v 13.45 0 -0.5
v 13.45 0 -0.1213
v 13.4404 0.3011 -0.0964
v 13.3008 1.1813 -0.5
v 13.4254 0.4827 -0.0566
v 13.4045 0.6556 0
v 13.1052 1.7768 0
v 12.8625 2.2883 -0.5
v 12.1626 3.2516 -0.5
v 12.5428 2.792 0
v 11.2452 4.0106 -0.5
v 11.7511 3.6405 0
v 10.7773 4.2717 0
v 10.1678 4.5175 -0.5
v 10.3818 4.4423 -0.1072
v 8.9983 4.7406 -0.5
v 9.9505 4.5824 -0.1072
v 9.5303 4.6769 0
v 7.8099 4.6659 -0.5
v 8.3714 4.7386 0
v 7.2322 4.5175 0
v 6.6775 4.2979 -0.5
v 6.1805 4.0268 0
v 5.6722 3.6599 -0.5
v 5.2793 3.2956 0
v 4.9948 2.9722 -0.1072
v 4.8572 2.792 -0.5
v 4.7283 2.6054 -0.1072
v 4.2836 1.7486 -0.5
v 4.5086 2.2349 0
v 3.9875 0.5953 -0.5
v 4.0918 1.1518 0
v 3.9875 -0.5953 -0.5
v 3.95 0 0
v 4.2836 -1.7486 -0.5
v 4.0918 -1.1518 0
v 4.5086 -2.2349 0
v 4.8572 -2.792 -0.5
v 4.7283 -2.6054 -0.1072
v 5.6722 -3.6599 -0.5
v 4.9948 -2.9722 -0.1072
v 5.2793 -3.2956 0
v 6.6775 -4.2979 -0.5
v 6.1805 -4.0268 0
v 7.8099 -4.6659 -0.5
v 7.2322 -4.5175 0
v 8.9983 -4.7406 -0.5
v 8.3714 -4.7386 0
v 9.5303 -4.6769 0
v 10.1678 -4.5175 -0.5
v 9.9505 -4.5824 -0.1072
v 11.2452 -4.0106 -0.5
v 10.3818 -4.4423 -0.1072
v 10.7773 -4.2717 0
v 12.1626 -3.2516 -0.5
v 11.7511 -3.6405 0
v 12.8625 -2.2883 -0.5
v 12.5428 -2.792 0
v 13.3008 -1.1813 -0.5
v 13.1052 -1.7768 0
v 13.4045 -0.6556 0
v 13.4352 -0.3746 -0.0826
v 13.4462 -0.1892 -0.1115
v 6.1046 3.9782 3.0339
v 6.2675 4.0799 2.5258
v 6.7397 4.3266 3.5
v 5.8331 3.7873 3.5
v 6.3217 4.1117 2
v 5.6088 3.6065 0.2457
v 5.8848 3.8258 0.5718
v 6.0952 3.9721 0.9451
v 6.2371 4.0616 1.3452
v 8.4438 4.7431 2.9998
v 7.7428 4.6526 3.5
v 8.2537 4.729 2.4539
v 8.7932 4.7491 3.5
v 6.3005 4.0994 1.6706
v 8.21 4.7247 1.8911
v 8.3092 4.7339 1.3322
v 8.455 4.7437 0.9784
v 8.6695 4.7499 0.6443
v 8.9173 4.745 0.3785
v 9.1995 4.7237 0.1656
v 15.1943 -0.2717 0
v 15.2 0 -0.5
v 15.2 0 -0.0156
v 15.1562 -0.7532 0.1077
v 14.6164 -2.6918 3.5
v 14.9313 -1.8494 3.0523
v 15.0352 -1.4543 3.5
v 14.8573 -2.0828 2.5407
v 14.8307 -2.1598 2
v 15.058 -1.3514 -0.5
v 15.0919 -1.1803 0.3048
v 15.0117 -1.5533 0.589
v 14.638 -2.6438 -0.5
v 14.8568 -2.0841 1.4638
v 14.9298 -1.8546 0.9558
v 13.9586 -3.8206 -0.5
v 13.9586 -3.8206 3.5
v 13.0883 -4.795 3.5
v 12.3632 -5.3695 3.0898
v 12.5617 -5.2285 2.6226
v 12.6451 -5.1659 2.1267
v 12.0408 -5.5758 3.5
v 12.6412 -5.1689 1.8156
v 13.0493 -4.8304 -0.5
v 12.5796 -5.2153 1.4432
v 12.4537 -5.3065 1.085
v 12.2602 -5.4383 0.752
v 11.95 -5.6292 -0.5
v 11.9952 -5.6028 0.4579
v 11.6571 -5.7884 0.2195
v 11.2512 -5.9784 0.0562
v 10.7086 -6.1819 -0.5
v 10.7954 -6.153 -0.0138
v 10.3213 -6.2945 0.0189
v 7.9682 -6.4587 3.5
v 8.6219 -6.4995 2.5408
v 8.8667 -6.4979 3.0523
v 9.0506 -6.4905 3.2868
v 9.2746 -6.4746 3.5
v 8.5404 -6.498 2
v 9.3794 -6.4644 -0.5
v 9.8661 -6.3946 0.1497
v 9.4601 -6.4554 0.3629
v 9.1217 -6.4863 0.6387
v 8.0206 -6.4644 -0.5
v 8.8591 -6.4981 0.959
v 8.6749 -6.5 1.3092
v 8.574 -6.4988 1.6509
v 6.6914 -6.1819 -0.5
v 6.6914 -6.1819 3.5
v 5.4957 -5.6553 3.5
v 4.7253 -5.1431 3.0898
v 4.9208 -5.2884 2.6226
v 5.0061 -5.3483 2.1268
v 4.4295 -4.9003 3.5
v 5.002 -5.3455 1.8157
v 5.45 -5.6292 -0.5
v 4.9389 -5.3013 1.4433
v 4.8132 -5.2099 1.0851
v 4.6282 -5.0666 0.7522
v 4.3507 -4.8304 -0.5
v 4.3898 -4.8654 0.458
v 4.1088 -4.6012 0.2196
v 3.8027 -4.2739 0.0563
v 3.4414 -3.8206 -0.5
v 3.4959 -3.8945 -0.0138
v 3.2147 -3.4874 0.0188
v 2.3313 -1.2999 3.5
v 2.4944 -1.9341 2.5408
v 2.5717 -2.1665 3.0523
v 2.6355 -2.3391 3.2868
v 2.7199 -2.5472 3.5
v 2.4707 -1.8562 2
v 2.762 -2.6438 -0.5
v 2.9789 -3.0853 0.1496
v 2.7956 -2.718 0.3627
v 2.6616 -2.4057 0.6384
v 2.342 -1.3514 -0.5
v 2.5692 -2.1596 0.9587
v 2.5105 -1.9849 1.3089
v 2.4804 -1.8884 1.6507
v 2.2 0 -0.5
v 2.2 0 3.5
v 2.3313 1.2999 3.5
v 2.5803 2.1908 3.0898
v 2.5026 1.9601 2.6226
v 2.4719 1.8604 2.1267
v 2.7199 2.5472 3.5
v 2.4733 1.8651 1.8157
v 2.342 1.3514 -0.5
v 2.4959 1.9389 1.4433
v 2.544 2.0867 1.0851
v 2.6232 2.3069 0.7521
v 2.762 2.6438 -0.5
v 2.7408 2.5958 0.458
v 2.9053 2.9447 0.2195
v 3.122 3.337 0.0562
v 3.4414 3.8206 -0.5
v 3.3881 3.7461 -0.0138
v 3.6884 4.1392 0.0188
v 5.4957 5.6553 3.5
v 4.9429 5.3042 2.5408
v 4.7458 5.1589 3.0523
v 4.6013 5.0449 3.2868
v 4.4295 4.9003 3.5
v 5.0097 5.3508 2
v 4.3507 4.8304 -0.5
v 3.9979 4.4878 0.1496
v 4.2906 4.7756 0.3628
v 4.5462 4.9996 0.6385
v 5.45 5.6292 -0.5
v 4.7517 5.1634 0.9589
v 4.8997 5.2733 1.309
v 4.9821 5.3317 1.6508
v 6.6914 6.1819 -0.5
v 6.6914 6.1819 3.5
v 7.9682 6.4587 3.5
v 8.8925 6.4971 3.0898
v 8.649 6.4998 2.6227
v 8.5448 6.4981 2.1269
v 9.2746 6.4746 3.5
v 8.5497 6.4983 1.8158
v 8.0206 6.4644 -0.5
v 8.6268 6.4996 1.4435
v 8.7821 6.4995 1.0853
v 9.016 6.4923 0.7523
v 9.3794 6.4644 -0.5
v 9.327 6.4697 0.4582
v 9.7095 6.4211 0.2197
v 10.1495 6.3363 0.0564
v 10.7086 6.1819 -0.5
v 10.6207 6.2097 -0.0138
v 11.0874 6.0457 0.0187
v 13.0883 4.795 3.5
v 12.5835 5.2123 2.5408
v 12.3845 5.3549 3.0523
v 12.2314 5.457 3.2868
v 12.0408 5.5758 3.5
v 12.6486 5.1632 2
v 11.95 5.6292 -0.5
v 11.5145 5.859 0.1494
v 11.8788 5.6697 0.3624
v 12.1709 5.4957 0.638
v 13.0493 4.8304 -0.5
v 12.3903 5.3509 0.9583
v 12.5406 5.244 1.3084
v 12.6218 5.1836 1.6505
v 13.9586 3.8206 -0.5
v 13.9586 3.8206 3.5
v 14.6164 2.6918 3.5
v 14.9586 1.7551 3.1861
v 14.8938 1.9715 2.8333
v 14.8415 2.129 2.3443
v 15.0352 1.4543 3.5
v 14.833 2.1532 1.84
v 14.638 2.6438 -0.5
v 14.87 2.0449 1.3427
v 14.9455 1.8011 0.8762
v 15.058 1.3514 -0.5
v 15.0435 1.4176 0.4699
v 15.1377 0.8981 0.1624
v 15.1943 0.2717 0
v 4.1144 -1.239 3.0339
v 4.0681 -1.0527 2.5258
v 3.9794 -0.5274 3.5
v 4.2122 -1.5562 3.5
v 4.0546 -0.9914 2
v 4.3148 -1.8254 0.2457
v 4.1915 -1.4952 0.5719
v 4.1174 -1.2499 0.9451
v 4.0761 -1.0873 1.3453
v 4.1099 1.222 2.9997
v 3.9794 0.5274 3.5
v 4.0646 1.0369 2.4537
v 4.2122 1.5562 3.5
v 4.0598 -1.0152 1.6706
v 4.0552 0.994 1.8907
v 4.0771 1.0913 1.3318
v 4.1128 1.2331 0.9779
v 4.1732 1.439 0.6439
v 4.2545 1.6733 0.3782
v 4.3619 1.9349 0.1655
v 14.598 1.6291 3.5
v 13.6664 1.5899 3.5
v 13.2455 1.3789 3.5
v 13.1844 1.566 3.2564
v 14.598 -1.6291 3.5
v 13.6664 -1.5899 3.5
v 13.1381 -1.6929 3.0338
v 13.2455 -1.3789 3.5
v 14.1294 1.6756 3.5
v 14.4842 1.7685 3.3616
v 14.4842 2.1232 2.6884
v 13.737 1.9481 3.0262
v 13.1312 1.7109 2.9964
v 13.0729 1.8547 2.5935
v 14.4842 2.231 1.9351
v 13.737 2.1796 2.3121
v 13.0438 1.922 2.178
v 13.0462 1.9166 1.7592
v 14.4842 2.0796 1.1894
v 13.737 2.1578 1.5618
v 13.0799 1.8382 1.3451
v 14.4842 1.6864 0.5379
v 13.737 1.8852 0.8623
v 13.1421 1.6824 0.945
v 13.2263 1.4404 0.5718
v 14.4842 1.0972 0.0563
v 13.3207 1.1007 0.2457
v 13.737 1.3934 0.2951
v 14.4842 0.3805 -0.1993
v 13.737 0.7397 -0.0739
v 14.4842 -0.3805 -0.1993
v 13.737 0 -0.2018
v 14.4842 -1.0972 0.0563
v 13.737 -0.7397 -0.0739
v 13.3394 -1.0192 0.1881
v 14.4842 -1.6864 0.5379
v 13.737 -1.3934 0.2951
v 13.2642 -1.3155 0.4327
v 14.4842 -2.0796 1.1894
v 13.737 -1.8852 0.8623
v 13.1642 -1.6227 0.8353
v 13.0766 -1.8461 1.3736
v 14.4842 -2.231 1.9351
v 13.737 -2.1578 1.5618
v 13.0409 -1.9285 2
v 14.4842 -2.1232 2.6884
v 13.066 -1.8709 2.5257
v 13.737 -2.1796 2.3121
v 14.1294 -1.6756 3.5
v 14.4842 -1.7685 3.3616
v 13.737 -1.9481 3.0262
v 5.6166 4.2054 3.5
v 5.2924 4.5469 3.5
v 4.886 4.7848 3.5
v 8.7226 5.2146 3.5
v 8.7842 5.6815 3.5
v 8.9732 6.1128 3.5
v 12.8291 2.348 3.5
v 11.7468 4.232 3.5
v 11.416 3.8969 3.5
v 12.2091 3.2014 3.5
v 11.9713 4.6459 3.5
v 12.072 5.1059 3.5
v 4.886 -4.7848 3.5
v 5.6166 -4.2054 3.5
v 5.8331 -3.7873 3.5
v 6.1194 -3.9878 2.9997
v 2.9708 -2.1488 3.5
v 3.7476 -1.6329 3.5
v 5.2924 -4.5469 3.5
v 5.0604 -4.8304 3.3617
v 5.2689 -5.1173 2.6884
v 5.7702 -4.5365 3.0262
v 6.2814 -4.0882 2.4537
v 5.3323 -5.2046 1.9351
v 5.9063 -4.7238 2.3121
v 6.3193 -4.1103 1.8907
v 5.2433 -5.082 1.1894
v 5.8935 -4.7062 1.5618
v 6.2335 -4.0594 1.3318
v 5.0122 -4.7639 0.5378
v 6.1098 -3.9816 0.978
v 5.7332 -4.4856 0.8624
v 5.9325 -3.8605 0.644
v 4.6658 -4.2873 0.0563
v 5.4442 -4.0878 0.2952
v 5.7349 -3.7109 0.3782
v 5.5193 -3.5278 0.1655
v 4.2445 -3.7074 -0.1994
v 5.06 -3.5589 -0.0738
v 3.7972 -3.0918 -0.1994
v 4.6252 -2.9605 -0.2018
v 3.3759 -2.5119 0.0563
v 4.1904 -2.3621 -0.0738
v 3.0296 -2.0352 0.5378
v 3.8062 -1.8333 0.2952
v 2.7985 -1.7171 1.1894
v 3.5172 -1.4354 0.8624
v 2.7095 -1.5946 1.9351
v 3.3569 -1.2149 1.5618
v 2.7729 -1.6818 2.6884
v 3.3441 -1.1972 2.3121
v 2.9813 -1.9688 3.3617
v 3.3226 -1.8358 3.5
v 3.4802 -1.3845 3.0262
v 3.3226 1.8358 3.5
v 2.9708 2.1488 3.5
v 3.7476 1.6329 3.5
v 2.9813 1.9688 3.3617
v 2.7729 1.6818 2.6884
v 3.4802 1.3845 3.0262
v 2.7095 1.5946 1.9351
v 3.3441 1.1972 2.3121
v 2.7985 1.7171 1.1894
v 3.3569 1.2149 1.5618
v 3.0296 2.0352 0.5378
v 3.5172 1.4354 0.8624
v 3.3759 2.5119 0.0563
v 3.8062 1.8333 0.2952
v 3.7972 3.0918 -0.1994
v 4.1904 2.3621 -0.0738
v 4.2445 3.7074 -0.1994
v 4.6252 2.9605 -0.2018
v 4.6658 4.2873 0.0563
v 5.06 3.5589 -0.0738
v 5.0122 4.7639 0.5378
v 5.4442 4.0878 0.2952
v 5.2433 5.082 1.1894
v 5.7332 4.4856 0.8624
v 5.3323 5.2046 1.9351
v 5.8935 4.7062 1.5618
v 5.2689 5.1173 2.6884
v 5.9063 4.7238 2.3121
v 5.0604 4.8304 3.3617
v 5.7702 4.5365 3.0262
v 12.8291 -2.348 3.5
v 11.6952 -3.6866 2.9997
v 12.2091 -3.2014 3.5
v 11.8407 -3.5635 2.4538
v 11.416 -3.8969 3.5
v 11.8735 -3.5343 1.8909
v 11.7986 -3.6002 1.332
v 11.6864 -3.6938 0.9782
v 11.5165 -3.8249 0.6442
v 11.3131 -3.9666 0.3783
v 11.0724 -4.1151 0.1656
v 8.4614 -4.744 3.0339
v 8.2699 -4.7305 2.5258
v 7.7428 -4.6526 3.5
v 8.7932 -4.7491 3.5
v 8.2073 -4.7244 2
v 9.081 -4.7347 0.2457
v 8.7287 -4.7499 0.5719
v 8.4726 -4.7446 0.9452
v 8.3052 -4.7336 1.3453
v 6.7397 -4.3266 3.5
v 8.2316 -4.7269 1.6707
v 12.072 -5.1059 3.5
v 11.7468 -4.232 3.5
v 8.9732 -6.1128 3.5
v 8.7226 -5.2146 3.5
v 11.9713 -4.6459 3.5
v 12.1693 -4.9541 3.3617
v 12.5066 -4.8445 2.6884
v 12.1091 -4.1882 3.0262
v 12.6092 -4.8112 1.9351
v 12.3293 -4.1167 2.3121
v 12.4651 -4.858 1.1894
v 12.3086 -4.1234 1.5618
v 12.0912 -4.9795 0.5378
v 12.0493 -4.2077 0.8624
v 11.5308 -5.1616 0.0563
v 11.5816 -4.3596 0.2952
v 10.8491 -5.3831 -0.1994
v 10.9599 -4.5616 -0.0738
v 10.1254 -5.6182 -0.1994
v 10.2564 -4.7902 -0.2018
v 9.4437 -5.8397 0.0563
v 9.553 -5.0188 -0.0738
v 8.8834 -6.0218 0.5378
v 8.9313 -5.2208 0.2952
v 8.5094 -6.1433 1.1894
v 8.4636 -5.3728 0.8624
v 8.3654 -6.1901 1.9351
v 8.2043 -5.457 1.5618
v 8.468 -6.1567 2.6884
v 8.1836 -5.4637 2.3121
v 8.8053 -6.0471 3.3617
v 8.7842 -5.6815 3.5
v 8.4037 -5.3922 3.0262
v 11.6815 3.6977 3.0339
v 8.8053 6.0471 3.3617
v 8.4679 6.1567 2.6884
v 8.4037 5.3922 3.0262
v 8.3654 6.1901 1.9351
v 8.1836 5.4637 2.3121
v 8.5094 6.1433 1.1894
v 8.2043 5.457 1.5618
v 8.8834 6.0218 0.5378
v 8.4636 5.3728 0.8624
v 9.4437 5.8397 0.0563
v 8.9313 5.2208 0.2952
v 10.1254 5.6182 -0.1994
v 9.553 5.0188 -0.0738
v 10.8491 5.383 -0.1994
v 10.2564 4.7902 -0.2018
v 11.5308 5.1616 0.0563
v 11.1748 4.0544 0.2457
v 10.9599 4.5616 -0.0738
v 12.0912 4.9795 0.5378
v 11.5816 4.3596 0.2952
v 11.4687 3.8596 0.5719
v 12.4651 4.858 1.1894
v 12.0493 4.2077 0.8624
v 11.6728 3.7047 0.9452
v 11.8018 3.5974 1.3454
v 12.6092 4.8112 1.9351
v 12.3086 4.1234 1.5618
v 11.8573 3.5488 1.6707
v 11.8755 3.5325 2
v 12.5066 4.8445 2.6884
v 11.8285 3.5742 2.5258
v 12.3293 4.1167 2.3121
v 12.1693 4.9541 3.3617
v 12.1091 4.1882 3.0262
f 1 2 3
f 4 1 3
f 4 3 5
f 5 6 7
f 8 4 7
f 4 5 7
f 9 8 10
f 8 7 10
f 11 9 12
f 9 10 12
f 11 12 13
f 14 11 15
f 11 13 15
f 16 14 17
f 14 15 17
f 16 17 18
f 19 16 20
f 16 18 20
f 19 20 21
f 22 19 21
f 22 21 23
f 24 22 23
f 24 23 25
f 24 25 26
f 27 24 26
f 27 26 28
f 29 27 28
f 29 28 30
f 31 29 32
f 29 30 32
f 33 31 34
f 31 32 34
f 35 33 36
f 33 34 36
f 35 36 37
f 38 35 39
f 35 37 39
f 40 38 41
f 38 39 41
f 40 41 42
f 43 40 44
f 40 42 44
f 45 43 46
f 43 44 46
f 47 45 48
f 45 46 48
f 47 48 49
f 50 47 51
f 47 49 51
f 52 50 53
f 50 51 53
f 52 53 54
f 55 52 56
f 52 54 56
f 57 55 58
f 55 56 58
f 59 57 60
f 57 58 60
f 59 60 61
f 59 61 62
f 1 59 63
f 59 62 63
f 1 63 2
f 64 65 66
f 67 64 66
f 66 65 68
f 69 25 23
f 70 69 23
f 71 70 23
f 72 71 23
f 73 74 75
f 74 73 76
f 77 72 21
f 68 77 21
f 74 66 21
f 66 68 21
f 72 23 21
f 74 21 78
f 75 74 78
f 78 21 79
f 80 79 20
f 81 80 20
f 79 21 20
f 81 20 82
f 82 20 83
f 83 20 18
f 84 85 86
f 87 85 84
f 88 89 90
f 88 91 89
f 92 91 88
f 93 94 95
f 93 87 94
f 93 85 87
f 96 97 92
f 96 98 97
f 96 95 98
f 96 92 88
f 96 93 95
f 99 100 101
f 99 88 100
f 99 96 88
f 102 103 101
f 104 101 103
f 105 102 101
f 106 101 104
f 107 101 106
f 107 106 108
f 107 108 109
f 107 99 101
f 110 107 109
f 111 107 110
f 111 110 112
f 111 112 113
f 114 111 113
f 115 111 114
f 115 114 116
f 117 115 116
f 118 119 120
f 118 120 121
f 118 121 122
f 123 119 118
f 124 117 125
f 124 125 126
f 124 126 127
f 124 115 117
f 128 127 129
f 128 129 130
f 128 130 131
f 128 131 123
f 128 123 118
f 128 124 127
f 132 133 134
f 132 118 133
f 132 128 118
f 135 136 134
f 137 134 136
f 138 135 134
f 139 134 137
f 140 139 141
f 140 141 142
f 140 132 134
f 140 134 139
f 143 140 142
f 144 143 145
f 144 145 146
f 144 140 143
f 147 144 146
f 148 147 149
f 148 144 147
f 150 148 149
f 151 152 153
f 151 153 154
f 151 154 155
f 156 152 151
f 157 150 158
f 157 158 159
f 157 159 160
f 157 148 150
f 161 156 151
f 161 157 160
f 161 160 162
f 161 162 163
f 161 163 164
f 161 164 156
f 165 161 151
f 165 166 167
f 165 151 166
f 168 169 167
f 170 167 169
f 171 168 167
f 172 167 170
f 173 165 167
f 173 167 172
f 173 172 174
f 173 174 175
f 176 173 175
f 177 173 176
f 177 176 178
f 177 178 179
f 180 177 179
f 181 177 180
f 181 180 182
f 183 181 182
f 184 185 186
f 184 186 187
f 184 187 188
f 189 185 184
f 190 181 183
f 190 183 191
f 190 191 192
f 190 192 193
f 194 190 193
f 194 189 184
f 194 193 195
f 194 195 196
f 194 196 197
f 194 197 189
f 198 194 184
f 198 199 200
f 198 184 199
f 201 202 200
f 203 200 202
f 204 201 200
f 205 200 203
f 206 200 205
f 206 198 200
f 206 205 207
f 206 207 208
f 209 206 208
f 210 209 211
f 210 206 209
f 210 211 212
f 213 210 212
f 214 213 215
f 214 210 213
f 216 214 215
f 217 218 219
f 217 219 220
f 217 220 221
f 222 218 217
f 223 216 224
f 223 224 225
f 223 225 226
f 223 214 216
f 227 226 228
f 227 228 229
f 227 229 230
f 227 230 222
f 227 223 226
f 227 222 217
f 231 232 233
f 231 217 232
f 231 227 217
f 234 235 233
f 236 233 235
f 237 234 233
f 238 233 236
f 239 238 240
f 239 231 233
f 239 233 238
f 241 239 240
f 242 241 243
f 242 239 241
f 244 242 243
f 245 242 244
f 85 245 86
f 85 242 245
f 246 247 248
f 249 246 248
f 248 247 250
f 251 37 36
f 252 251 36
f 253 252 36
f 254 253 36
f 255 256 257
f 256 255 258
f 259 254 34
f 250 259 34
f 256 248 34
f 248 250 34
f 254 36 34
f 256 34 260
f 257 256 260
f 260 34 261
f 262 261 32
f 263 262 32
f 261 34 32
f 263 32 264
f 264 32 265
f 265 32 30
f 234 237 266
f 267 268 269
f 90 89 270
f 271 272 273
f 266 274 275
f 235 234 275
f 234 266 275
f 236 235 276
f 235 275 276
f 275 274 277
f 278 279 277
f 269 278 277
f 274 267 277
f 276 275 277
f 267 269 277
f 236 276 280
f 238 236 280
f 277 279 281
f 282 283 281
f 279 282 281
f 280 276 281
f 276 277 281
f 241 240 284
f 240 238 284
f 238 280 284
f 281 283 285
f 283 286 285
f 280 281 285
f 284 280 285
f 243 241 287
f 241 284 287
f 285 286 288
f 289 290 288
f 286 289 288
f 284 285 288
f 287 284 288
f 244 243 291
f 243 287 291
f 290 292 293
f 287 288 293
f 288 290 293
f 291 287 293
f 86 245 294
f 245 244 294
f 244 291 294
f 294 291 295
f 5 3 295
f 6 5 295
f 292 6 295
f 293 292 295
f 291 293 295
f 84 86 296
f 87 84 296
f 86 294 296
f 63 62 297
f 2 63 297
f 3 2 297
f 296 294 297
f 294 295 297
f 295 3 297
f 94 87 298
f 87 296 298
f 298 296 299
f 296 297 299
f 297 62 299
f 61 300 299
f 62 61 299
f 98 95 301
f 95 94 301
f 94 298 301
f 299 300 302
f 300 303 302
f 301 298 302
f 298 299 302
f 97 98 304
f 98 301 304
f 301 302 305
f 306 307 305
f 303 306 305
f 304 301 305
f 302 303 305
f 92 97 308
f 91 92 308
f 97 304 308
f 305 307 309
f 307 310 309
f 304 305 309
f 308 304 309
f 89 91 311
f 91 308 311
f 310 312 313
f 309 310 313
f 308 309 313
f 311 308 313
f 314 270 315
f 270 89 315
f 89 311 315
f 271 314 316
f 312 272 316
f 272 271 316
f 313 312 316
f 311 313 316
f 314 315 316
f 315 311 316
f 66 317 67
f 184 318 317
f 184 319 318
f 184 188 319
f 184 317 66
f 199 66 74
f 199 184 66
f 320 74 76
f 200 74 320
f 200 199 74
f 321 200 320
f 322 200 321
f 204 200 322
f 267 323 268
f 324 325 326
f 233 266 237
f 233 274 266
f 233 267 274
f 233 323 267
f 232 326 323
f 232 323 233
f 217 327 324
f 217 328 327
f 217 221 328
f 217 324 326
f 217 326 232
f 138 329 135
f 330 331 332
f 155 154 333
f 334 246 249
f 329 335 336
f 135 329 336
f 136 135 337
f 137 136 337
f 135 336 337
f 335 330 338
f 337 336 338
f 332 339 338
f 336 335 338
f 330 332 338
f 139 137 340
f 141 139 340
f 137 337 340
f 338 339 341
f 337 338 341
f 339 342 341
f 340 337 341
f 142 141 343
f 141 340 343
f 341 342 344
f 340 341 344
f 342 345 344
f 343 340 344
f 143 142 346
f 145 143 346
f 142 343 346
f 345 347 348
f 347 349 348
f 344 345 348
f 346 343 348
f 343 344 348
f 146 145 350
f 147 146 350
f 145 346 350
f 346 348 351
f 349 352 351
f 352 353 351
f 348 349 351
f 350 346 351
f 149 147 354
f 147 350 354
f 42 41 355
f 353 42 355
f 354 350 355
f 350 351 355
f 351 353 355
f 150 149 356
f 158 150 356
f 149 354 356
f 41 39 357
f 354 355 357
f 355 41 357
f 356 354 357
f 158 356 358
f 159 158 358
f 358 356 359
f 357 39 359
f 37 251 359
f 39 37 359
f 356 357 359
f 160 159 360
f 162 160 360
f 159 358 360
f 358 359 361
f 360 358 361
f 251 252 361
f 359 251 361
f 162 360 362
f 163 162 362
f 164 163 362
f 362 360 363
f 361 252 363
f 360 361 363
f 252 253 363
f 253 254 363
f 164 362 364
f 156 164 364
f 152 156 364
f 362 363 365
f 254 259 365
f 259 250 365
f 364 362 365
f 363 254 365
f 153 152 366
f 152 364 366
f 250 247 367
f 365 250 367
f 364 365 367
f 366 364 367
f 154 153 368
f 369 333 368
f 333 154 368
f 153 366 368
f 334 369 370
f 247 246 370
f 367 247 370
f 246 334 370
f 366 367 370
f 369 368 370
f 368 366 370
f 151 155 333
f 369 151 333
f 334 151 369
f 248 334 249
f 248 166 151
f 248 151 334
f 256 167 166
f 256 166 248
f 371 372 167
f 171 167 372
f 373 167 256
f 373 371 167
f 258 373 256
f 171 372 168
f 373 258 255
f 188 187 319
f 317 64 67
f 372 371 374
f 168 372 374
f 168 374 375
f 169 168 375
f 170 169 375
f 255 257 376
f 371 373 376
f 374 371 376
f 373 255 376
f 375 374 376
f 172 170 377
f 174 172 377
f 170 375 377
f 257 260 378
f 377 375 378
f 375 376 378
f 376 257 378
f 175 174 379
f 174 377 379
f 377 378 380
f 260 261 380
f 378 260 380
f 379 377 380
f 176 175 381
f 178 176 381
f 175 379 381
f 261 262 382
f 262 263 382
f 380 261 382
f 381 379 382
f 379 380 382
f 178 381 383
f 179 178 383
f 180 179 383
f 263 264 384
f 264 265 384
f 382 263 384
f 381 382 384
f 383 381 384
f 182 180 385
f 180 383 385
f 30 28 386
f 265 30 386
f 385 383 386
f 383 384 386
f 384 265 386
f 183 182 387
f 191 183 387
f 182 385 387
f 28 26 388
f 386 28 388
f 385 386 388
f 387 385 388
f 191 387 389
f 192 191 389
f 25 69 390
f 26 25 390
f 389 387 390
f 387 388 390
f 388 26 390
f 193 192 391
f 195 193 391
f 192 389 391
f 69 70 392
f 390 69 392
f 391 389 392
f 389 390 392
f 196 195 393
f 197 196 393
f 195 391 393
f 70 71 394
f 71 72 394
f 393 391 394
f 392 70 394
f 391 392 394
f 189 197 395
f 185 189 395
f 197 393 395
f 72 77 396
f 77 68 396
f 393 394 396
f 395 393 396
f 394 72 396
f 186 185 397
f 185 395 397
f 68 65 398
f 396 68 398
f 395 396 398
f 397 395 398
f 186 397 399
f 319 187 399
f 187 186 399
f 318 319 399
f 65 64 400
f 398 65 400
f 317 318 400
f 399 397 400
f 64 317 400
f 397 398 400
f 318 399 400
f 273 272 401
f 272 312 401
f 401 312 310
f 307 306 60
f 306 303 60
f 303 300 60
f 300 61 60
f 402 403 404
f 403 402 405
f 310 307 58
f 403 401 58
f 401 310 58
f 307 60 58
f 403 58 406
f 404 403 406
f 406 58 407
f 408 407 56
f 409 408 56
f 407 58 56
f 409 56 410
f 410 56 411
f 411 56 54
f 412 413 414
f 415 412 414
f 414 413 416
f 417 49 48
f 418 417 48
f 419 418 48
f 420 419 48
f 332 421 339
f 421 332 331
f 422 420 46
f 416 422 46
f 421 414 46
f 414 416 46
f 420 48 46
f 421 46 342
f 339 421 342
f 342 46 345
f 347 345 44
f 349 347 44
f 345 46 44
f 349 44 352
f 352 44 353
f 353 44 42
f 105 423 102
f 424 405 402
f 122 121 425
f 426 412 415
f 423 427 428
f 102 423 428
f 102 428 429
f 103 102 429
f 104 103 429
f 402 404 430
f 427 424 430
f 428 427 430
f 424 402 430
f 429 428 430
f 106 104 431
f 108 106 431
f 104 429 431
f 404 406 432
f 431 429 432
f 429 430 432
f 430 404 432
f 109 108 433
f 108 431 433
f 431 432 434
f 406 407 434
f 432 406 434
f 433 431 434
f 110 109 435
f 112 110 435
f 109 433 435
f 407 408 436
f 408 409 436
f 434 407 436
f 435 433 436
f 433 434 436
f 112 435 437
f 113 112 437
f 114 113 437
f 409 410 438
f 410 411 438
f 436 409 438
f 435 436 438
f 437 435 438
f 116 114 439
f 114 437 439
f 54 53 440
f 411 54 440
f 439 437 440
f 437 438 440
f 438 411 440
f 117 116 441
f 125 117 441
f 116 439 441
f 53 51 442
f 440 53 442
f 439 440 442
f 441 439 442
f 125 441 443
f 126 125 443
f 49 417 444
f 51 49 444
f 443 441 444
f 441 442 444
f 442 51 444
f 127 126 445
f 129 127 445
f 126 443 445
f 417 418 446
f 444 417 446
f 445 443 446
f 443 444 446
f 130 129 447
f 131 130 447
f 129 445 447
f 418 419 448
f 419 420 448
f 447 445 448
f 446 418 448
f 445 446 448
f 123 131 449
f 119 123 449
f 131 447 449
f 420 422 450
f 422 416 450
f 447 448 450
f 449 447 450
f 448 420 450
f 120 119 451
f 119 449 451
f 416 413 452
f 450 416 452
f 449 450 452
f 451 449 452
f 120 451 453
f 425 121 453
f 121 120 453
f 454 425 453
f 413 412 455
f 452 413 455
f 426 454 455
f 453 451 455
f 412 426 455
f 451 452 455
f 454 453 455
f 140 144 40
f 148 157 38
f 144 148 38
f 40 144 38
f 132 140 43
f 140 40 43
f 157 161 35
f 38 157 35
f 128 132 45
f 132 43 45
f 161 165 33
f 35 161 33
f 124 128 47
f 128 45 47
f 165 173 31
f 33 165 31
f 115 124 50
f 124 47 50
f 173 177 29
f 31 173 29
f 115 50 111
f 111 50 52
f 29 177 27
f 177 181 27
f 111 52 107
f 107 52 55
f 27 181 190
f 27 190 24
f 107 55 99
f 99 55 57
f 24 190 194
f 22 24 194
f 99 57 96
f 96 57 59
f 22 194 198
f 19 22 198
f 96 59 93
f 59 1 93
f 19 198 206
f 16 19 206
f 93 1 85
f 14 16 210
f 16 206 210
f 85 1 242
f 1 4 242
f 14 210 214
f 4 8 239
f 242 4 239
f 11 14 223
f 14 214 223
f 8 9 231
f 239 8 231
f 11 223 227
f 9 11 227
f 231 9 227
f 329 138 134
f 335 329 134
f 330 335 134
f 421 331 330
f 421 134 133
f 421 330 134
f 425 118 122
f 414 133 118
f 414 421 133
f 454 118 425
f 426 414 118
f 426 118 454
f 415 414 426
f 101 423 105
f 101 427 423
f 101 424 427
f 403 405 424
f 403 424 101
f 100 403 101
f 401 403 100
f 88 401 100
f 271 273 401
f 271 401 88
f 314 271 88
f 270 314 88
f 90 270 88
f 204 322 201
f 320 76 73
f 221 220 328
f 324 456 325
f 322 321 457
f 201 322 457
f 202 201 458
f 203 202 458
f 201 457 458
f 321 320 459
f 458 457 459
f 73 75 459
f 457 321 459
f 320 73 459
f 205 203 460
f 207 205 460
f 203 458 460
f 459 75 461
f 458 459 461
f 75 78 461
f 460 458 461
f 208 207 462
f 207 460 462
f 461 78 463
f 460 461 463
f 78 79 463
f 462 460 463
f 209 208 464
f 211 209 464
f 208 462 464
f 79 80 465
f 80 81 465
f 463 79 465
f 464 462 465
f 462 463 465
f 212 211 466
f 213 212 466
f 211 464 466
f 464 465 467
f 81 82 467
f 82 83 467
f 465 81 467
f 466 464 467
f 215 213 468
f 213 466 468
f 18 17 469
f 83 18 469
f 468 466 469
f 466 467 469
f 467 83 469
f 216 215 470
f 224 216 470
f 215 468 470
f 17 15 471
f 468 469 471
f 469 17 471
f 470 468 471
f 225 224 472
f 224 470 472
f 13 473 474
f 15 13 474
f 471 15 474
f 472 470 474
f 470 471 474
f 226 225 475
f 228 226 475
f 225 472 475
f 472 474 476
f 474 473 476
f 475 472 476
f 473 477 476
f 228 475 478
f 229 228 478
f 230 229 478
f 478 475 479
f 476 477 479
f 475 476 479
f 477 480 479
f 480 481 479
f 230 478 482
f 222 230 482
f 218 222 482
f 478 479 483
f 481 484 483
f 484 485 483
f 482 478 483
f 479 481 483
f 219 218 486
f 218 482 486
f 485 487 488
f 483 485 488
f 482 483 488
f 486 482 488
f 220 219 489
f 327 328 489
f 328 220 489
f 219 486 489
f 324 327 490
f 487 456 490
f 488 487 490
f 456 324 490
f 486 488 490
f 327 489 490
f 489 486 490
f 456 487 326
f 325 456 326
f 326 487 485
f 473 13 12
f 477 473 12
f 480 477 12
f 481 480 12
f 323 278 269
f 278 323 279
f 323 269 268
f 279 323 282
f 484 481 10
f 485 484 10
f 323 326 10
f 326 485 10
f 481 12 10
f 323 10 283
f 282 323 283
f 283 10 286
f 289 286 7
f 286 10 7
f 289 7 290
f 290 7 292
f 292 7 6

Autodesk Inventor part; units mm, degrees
ref_plane "YZ Plane" through (0, 0, 0) normal (1, 0, 0) x (0, 1, 0)
ref_plane "XZ Plane" through (0, 0, 0) normal (0, 1, 0) x (-1, 0, 0)
sketch "Sketch1" plane through (0, 0, 0) normal (0, 0, 1) x (1, 0, 0)
  circle A0 centre (8.7, 0) radius 3.375
  circle A1 centre (8.7, 0) radius 6.5
  circle A2 centre (8.7, 0) radius 4.75
  point P0 (0, 0)
  dimension "d0" = 13
  dimension "d1" = 9.5
extrude "Extrusion1" add sketch "Sketch1" along normal blind 3.5 and the other way blind 0.5 contours A1
ref_plane "Work Plane1" through (8.7, 0, 2) normal (0, 0, -1) x (-1, 0, 0)
sketch "Sketch2" plane through (8.7, 0, 2) normal (0, 0, -1) x (-1, 0, 0)
  circle A0 centre (0, 0) radius 6.5 projected
  circle A1 centre (0, 0) radius 4.75 projected
  circle A2 centre (0, 0) radius 5.5
  circle A3 centre (-5.5, 0) radius 2.25
  line L0 (-7.75, 0) -> (-3.25, 0)
  point P0 (8.7, 0)
  dimension "d5" = 11
  dimension "d6" = 4.5
revolve "Revolution1" cut sketch "Sketch2" angle 360 about axis through (16.45, 0, 2) along (-1, 0, 0) picked at (-6.8857, -0.4037) picked at (-5.7999, -1.7269) picked at (-5.2327, -0.251) picked at (-4.2505, -0.3733) contours A3 L0 A0 | A0 L0 A2 A3 | A2 L0 A1 A3 | A1 L0 A3
pattern_circular "Circular Pattern1" count 5 over 360 about axis through (8.7, 0, 3.5) along (0, 0, -1) of "Revolution1"
properties part number "Hex Bearing Spacer"
